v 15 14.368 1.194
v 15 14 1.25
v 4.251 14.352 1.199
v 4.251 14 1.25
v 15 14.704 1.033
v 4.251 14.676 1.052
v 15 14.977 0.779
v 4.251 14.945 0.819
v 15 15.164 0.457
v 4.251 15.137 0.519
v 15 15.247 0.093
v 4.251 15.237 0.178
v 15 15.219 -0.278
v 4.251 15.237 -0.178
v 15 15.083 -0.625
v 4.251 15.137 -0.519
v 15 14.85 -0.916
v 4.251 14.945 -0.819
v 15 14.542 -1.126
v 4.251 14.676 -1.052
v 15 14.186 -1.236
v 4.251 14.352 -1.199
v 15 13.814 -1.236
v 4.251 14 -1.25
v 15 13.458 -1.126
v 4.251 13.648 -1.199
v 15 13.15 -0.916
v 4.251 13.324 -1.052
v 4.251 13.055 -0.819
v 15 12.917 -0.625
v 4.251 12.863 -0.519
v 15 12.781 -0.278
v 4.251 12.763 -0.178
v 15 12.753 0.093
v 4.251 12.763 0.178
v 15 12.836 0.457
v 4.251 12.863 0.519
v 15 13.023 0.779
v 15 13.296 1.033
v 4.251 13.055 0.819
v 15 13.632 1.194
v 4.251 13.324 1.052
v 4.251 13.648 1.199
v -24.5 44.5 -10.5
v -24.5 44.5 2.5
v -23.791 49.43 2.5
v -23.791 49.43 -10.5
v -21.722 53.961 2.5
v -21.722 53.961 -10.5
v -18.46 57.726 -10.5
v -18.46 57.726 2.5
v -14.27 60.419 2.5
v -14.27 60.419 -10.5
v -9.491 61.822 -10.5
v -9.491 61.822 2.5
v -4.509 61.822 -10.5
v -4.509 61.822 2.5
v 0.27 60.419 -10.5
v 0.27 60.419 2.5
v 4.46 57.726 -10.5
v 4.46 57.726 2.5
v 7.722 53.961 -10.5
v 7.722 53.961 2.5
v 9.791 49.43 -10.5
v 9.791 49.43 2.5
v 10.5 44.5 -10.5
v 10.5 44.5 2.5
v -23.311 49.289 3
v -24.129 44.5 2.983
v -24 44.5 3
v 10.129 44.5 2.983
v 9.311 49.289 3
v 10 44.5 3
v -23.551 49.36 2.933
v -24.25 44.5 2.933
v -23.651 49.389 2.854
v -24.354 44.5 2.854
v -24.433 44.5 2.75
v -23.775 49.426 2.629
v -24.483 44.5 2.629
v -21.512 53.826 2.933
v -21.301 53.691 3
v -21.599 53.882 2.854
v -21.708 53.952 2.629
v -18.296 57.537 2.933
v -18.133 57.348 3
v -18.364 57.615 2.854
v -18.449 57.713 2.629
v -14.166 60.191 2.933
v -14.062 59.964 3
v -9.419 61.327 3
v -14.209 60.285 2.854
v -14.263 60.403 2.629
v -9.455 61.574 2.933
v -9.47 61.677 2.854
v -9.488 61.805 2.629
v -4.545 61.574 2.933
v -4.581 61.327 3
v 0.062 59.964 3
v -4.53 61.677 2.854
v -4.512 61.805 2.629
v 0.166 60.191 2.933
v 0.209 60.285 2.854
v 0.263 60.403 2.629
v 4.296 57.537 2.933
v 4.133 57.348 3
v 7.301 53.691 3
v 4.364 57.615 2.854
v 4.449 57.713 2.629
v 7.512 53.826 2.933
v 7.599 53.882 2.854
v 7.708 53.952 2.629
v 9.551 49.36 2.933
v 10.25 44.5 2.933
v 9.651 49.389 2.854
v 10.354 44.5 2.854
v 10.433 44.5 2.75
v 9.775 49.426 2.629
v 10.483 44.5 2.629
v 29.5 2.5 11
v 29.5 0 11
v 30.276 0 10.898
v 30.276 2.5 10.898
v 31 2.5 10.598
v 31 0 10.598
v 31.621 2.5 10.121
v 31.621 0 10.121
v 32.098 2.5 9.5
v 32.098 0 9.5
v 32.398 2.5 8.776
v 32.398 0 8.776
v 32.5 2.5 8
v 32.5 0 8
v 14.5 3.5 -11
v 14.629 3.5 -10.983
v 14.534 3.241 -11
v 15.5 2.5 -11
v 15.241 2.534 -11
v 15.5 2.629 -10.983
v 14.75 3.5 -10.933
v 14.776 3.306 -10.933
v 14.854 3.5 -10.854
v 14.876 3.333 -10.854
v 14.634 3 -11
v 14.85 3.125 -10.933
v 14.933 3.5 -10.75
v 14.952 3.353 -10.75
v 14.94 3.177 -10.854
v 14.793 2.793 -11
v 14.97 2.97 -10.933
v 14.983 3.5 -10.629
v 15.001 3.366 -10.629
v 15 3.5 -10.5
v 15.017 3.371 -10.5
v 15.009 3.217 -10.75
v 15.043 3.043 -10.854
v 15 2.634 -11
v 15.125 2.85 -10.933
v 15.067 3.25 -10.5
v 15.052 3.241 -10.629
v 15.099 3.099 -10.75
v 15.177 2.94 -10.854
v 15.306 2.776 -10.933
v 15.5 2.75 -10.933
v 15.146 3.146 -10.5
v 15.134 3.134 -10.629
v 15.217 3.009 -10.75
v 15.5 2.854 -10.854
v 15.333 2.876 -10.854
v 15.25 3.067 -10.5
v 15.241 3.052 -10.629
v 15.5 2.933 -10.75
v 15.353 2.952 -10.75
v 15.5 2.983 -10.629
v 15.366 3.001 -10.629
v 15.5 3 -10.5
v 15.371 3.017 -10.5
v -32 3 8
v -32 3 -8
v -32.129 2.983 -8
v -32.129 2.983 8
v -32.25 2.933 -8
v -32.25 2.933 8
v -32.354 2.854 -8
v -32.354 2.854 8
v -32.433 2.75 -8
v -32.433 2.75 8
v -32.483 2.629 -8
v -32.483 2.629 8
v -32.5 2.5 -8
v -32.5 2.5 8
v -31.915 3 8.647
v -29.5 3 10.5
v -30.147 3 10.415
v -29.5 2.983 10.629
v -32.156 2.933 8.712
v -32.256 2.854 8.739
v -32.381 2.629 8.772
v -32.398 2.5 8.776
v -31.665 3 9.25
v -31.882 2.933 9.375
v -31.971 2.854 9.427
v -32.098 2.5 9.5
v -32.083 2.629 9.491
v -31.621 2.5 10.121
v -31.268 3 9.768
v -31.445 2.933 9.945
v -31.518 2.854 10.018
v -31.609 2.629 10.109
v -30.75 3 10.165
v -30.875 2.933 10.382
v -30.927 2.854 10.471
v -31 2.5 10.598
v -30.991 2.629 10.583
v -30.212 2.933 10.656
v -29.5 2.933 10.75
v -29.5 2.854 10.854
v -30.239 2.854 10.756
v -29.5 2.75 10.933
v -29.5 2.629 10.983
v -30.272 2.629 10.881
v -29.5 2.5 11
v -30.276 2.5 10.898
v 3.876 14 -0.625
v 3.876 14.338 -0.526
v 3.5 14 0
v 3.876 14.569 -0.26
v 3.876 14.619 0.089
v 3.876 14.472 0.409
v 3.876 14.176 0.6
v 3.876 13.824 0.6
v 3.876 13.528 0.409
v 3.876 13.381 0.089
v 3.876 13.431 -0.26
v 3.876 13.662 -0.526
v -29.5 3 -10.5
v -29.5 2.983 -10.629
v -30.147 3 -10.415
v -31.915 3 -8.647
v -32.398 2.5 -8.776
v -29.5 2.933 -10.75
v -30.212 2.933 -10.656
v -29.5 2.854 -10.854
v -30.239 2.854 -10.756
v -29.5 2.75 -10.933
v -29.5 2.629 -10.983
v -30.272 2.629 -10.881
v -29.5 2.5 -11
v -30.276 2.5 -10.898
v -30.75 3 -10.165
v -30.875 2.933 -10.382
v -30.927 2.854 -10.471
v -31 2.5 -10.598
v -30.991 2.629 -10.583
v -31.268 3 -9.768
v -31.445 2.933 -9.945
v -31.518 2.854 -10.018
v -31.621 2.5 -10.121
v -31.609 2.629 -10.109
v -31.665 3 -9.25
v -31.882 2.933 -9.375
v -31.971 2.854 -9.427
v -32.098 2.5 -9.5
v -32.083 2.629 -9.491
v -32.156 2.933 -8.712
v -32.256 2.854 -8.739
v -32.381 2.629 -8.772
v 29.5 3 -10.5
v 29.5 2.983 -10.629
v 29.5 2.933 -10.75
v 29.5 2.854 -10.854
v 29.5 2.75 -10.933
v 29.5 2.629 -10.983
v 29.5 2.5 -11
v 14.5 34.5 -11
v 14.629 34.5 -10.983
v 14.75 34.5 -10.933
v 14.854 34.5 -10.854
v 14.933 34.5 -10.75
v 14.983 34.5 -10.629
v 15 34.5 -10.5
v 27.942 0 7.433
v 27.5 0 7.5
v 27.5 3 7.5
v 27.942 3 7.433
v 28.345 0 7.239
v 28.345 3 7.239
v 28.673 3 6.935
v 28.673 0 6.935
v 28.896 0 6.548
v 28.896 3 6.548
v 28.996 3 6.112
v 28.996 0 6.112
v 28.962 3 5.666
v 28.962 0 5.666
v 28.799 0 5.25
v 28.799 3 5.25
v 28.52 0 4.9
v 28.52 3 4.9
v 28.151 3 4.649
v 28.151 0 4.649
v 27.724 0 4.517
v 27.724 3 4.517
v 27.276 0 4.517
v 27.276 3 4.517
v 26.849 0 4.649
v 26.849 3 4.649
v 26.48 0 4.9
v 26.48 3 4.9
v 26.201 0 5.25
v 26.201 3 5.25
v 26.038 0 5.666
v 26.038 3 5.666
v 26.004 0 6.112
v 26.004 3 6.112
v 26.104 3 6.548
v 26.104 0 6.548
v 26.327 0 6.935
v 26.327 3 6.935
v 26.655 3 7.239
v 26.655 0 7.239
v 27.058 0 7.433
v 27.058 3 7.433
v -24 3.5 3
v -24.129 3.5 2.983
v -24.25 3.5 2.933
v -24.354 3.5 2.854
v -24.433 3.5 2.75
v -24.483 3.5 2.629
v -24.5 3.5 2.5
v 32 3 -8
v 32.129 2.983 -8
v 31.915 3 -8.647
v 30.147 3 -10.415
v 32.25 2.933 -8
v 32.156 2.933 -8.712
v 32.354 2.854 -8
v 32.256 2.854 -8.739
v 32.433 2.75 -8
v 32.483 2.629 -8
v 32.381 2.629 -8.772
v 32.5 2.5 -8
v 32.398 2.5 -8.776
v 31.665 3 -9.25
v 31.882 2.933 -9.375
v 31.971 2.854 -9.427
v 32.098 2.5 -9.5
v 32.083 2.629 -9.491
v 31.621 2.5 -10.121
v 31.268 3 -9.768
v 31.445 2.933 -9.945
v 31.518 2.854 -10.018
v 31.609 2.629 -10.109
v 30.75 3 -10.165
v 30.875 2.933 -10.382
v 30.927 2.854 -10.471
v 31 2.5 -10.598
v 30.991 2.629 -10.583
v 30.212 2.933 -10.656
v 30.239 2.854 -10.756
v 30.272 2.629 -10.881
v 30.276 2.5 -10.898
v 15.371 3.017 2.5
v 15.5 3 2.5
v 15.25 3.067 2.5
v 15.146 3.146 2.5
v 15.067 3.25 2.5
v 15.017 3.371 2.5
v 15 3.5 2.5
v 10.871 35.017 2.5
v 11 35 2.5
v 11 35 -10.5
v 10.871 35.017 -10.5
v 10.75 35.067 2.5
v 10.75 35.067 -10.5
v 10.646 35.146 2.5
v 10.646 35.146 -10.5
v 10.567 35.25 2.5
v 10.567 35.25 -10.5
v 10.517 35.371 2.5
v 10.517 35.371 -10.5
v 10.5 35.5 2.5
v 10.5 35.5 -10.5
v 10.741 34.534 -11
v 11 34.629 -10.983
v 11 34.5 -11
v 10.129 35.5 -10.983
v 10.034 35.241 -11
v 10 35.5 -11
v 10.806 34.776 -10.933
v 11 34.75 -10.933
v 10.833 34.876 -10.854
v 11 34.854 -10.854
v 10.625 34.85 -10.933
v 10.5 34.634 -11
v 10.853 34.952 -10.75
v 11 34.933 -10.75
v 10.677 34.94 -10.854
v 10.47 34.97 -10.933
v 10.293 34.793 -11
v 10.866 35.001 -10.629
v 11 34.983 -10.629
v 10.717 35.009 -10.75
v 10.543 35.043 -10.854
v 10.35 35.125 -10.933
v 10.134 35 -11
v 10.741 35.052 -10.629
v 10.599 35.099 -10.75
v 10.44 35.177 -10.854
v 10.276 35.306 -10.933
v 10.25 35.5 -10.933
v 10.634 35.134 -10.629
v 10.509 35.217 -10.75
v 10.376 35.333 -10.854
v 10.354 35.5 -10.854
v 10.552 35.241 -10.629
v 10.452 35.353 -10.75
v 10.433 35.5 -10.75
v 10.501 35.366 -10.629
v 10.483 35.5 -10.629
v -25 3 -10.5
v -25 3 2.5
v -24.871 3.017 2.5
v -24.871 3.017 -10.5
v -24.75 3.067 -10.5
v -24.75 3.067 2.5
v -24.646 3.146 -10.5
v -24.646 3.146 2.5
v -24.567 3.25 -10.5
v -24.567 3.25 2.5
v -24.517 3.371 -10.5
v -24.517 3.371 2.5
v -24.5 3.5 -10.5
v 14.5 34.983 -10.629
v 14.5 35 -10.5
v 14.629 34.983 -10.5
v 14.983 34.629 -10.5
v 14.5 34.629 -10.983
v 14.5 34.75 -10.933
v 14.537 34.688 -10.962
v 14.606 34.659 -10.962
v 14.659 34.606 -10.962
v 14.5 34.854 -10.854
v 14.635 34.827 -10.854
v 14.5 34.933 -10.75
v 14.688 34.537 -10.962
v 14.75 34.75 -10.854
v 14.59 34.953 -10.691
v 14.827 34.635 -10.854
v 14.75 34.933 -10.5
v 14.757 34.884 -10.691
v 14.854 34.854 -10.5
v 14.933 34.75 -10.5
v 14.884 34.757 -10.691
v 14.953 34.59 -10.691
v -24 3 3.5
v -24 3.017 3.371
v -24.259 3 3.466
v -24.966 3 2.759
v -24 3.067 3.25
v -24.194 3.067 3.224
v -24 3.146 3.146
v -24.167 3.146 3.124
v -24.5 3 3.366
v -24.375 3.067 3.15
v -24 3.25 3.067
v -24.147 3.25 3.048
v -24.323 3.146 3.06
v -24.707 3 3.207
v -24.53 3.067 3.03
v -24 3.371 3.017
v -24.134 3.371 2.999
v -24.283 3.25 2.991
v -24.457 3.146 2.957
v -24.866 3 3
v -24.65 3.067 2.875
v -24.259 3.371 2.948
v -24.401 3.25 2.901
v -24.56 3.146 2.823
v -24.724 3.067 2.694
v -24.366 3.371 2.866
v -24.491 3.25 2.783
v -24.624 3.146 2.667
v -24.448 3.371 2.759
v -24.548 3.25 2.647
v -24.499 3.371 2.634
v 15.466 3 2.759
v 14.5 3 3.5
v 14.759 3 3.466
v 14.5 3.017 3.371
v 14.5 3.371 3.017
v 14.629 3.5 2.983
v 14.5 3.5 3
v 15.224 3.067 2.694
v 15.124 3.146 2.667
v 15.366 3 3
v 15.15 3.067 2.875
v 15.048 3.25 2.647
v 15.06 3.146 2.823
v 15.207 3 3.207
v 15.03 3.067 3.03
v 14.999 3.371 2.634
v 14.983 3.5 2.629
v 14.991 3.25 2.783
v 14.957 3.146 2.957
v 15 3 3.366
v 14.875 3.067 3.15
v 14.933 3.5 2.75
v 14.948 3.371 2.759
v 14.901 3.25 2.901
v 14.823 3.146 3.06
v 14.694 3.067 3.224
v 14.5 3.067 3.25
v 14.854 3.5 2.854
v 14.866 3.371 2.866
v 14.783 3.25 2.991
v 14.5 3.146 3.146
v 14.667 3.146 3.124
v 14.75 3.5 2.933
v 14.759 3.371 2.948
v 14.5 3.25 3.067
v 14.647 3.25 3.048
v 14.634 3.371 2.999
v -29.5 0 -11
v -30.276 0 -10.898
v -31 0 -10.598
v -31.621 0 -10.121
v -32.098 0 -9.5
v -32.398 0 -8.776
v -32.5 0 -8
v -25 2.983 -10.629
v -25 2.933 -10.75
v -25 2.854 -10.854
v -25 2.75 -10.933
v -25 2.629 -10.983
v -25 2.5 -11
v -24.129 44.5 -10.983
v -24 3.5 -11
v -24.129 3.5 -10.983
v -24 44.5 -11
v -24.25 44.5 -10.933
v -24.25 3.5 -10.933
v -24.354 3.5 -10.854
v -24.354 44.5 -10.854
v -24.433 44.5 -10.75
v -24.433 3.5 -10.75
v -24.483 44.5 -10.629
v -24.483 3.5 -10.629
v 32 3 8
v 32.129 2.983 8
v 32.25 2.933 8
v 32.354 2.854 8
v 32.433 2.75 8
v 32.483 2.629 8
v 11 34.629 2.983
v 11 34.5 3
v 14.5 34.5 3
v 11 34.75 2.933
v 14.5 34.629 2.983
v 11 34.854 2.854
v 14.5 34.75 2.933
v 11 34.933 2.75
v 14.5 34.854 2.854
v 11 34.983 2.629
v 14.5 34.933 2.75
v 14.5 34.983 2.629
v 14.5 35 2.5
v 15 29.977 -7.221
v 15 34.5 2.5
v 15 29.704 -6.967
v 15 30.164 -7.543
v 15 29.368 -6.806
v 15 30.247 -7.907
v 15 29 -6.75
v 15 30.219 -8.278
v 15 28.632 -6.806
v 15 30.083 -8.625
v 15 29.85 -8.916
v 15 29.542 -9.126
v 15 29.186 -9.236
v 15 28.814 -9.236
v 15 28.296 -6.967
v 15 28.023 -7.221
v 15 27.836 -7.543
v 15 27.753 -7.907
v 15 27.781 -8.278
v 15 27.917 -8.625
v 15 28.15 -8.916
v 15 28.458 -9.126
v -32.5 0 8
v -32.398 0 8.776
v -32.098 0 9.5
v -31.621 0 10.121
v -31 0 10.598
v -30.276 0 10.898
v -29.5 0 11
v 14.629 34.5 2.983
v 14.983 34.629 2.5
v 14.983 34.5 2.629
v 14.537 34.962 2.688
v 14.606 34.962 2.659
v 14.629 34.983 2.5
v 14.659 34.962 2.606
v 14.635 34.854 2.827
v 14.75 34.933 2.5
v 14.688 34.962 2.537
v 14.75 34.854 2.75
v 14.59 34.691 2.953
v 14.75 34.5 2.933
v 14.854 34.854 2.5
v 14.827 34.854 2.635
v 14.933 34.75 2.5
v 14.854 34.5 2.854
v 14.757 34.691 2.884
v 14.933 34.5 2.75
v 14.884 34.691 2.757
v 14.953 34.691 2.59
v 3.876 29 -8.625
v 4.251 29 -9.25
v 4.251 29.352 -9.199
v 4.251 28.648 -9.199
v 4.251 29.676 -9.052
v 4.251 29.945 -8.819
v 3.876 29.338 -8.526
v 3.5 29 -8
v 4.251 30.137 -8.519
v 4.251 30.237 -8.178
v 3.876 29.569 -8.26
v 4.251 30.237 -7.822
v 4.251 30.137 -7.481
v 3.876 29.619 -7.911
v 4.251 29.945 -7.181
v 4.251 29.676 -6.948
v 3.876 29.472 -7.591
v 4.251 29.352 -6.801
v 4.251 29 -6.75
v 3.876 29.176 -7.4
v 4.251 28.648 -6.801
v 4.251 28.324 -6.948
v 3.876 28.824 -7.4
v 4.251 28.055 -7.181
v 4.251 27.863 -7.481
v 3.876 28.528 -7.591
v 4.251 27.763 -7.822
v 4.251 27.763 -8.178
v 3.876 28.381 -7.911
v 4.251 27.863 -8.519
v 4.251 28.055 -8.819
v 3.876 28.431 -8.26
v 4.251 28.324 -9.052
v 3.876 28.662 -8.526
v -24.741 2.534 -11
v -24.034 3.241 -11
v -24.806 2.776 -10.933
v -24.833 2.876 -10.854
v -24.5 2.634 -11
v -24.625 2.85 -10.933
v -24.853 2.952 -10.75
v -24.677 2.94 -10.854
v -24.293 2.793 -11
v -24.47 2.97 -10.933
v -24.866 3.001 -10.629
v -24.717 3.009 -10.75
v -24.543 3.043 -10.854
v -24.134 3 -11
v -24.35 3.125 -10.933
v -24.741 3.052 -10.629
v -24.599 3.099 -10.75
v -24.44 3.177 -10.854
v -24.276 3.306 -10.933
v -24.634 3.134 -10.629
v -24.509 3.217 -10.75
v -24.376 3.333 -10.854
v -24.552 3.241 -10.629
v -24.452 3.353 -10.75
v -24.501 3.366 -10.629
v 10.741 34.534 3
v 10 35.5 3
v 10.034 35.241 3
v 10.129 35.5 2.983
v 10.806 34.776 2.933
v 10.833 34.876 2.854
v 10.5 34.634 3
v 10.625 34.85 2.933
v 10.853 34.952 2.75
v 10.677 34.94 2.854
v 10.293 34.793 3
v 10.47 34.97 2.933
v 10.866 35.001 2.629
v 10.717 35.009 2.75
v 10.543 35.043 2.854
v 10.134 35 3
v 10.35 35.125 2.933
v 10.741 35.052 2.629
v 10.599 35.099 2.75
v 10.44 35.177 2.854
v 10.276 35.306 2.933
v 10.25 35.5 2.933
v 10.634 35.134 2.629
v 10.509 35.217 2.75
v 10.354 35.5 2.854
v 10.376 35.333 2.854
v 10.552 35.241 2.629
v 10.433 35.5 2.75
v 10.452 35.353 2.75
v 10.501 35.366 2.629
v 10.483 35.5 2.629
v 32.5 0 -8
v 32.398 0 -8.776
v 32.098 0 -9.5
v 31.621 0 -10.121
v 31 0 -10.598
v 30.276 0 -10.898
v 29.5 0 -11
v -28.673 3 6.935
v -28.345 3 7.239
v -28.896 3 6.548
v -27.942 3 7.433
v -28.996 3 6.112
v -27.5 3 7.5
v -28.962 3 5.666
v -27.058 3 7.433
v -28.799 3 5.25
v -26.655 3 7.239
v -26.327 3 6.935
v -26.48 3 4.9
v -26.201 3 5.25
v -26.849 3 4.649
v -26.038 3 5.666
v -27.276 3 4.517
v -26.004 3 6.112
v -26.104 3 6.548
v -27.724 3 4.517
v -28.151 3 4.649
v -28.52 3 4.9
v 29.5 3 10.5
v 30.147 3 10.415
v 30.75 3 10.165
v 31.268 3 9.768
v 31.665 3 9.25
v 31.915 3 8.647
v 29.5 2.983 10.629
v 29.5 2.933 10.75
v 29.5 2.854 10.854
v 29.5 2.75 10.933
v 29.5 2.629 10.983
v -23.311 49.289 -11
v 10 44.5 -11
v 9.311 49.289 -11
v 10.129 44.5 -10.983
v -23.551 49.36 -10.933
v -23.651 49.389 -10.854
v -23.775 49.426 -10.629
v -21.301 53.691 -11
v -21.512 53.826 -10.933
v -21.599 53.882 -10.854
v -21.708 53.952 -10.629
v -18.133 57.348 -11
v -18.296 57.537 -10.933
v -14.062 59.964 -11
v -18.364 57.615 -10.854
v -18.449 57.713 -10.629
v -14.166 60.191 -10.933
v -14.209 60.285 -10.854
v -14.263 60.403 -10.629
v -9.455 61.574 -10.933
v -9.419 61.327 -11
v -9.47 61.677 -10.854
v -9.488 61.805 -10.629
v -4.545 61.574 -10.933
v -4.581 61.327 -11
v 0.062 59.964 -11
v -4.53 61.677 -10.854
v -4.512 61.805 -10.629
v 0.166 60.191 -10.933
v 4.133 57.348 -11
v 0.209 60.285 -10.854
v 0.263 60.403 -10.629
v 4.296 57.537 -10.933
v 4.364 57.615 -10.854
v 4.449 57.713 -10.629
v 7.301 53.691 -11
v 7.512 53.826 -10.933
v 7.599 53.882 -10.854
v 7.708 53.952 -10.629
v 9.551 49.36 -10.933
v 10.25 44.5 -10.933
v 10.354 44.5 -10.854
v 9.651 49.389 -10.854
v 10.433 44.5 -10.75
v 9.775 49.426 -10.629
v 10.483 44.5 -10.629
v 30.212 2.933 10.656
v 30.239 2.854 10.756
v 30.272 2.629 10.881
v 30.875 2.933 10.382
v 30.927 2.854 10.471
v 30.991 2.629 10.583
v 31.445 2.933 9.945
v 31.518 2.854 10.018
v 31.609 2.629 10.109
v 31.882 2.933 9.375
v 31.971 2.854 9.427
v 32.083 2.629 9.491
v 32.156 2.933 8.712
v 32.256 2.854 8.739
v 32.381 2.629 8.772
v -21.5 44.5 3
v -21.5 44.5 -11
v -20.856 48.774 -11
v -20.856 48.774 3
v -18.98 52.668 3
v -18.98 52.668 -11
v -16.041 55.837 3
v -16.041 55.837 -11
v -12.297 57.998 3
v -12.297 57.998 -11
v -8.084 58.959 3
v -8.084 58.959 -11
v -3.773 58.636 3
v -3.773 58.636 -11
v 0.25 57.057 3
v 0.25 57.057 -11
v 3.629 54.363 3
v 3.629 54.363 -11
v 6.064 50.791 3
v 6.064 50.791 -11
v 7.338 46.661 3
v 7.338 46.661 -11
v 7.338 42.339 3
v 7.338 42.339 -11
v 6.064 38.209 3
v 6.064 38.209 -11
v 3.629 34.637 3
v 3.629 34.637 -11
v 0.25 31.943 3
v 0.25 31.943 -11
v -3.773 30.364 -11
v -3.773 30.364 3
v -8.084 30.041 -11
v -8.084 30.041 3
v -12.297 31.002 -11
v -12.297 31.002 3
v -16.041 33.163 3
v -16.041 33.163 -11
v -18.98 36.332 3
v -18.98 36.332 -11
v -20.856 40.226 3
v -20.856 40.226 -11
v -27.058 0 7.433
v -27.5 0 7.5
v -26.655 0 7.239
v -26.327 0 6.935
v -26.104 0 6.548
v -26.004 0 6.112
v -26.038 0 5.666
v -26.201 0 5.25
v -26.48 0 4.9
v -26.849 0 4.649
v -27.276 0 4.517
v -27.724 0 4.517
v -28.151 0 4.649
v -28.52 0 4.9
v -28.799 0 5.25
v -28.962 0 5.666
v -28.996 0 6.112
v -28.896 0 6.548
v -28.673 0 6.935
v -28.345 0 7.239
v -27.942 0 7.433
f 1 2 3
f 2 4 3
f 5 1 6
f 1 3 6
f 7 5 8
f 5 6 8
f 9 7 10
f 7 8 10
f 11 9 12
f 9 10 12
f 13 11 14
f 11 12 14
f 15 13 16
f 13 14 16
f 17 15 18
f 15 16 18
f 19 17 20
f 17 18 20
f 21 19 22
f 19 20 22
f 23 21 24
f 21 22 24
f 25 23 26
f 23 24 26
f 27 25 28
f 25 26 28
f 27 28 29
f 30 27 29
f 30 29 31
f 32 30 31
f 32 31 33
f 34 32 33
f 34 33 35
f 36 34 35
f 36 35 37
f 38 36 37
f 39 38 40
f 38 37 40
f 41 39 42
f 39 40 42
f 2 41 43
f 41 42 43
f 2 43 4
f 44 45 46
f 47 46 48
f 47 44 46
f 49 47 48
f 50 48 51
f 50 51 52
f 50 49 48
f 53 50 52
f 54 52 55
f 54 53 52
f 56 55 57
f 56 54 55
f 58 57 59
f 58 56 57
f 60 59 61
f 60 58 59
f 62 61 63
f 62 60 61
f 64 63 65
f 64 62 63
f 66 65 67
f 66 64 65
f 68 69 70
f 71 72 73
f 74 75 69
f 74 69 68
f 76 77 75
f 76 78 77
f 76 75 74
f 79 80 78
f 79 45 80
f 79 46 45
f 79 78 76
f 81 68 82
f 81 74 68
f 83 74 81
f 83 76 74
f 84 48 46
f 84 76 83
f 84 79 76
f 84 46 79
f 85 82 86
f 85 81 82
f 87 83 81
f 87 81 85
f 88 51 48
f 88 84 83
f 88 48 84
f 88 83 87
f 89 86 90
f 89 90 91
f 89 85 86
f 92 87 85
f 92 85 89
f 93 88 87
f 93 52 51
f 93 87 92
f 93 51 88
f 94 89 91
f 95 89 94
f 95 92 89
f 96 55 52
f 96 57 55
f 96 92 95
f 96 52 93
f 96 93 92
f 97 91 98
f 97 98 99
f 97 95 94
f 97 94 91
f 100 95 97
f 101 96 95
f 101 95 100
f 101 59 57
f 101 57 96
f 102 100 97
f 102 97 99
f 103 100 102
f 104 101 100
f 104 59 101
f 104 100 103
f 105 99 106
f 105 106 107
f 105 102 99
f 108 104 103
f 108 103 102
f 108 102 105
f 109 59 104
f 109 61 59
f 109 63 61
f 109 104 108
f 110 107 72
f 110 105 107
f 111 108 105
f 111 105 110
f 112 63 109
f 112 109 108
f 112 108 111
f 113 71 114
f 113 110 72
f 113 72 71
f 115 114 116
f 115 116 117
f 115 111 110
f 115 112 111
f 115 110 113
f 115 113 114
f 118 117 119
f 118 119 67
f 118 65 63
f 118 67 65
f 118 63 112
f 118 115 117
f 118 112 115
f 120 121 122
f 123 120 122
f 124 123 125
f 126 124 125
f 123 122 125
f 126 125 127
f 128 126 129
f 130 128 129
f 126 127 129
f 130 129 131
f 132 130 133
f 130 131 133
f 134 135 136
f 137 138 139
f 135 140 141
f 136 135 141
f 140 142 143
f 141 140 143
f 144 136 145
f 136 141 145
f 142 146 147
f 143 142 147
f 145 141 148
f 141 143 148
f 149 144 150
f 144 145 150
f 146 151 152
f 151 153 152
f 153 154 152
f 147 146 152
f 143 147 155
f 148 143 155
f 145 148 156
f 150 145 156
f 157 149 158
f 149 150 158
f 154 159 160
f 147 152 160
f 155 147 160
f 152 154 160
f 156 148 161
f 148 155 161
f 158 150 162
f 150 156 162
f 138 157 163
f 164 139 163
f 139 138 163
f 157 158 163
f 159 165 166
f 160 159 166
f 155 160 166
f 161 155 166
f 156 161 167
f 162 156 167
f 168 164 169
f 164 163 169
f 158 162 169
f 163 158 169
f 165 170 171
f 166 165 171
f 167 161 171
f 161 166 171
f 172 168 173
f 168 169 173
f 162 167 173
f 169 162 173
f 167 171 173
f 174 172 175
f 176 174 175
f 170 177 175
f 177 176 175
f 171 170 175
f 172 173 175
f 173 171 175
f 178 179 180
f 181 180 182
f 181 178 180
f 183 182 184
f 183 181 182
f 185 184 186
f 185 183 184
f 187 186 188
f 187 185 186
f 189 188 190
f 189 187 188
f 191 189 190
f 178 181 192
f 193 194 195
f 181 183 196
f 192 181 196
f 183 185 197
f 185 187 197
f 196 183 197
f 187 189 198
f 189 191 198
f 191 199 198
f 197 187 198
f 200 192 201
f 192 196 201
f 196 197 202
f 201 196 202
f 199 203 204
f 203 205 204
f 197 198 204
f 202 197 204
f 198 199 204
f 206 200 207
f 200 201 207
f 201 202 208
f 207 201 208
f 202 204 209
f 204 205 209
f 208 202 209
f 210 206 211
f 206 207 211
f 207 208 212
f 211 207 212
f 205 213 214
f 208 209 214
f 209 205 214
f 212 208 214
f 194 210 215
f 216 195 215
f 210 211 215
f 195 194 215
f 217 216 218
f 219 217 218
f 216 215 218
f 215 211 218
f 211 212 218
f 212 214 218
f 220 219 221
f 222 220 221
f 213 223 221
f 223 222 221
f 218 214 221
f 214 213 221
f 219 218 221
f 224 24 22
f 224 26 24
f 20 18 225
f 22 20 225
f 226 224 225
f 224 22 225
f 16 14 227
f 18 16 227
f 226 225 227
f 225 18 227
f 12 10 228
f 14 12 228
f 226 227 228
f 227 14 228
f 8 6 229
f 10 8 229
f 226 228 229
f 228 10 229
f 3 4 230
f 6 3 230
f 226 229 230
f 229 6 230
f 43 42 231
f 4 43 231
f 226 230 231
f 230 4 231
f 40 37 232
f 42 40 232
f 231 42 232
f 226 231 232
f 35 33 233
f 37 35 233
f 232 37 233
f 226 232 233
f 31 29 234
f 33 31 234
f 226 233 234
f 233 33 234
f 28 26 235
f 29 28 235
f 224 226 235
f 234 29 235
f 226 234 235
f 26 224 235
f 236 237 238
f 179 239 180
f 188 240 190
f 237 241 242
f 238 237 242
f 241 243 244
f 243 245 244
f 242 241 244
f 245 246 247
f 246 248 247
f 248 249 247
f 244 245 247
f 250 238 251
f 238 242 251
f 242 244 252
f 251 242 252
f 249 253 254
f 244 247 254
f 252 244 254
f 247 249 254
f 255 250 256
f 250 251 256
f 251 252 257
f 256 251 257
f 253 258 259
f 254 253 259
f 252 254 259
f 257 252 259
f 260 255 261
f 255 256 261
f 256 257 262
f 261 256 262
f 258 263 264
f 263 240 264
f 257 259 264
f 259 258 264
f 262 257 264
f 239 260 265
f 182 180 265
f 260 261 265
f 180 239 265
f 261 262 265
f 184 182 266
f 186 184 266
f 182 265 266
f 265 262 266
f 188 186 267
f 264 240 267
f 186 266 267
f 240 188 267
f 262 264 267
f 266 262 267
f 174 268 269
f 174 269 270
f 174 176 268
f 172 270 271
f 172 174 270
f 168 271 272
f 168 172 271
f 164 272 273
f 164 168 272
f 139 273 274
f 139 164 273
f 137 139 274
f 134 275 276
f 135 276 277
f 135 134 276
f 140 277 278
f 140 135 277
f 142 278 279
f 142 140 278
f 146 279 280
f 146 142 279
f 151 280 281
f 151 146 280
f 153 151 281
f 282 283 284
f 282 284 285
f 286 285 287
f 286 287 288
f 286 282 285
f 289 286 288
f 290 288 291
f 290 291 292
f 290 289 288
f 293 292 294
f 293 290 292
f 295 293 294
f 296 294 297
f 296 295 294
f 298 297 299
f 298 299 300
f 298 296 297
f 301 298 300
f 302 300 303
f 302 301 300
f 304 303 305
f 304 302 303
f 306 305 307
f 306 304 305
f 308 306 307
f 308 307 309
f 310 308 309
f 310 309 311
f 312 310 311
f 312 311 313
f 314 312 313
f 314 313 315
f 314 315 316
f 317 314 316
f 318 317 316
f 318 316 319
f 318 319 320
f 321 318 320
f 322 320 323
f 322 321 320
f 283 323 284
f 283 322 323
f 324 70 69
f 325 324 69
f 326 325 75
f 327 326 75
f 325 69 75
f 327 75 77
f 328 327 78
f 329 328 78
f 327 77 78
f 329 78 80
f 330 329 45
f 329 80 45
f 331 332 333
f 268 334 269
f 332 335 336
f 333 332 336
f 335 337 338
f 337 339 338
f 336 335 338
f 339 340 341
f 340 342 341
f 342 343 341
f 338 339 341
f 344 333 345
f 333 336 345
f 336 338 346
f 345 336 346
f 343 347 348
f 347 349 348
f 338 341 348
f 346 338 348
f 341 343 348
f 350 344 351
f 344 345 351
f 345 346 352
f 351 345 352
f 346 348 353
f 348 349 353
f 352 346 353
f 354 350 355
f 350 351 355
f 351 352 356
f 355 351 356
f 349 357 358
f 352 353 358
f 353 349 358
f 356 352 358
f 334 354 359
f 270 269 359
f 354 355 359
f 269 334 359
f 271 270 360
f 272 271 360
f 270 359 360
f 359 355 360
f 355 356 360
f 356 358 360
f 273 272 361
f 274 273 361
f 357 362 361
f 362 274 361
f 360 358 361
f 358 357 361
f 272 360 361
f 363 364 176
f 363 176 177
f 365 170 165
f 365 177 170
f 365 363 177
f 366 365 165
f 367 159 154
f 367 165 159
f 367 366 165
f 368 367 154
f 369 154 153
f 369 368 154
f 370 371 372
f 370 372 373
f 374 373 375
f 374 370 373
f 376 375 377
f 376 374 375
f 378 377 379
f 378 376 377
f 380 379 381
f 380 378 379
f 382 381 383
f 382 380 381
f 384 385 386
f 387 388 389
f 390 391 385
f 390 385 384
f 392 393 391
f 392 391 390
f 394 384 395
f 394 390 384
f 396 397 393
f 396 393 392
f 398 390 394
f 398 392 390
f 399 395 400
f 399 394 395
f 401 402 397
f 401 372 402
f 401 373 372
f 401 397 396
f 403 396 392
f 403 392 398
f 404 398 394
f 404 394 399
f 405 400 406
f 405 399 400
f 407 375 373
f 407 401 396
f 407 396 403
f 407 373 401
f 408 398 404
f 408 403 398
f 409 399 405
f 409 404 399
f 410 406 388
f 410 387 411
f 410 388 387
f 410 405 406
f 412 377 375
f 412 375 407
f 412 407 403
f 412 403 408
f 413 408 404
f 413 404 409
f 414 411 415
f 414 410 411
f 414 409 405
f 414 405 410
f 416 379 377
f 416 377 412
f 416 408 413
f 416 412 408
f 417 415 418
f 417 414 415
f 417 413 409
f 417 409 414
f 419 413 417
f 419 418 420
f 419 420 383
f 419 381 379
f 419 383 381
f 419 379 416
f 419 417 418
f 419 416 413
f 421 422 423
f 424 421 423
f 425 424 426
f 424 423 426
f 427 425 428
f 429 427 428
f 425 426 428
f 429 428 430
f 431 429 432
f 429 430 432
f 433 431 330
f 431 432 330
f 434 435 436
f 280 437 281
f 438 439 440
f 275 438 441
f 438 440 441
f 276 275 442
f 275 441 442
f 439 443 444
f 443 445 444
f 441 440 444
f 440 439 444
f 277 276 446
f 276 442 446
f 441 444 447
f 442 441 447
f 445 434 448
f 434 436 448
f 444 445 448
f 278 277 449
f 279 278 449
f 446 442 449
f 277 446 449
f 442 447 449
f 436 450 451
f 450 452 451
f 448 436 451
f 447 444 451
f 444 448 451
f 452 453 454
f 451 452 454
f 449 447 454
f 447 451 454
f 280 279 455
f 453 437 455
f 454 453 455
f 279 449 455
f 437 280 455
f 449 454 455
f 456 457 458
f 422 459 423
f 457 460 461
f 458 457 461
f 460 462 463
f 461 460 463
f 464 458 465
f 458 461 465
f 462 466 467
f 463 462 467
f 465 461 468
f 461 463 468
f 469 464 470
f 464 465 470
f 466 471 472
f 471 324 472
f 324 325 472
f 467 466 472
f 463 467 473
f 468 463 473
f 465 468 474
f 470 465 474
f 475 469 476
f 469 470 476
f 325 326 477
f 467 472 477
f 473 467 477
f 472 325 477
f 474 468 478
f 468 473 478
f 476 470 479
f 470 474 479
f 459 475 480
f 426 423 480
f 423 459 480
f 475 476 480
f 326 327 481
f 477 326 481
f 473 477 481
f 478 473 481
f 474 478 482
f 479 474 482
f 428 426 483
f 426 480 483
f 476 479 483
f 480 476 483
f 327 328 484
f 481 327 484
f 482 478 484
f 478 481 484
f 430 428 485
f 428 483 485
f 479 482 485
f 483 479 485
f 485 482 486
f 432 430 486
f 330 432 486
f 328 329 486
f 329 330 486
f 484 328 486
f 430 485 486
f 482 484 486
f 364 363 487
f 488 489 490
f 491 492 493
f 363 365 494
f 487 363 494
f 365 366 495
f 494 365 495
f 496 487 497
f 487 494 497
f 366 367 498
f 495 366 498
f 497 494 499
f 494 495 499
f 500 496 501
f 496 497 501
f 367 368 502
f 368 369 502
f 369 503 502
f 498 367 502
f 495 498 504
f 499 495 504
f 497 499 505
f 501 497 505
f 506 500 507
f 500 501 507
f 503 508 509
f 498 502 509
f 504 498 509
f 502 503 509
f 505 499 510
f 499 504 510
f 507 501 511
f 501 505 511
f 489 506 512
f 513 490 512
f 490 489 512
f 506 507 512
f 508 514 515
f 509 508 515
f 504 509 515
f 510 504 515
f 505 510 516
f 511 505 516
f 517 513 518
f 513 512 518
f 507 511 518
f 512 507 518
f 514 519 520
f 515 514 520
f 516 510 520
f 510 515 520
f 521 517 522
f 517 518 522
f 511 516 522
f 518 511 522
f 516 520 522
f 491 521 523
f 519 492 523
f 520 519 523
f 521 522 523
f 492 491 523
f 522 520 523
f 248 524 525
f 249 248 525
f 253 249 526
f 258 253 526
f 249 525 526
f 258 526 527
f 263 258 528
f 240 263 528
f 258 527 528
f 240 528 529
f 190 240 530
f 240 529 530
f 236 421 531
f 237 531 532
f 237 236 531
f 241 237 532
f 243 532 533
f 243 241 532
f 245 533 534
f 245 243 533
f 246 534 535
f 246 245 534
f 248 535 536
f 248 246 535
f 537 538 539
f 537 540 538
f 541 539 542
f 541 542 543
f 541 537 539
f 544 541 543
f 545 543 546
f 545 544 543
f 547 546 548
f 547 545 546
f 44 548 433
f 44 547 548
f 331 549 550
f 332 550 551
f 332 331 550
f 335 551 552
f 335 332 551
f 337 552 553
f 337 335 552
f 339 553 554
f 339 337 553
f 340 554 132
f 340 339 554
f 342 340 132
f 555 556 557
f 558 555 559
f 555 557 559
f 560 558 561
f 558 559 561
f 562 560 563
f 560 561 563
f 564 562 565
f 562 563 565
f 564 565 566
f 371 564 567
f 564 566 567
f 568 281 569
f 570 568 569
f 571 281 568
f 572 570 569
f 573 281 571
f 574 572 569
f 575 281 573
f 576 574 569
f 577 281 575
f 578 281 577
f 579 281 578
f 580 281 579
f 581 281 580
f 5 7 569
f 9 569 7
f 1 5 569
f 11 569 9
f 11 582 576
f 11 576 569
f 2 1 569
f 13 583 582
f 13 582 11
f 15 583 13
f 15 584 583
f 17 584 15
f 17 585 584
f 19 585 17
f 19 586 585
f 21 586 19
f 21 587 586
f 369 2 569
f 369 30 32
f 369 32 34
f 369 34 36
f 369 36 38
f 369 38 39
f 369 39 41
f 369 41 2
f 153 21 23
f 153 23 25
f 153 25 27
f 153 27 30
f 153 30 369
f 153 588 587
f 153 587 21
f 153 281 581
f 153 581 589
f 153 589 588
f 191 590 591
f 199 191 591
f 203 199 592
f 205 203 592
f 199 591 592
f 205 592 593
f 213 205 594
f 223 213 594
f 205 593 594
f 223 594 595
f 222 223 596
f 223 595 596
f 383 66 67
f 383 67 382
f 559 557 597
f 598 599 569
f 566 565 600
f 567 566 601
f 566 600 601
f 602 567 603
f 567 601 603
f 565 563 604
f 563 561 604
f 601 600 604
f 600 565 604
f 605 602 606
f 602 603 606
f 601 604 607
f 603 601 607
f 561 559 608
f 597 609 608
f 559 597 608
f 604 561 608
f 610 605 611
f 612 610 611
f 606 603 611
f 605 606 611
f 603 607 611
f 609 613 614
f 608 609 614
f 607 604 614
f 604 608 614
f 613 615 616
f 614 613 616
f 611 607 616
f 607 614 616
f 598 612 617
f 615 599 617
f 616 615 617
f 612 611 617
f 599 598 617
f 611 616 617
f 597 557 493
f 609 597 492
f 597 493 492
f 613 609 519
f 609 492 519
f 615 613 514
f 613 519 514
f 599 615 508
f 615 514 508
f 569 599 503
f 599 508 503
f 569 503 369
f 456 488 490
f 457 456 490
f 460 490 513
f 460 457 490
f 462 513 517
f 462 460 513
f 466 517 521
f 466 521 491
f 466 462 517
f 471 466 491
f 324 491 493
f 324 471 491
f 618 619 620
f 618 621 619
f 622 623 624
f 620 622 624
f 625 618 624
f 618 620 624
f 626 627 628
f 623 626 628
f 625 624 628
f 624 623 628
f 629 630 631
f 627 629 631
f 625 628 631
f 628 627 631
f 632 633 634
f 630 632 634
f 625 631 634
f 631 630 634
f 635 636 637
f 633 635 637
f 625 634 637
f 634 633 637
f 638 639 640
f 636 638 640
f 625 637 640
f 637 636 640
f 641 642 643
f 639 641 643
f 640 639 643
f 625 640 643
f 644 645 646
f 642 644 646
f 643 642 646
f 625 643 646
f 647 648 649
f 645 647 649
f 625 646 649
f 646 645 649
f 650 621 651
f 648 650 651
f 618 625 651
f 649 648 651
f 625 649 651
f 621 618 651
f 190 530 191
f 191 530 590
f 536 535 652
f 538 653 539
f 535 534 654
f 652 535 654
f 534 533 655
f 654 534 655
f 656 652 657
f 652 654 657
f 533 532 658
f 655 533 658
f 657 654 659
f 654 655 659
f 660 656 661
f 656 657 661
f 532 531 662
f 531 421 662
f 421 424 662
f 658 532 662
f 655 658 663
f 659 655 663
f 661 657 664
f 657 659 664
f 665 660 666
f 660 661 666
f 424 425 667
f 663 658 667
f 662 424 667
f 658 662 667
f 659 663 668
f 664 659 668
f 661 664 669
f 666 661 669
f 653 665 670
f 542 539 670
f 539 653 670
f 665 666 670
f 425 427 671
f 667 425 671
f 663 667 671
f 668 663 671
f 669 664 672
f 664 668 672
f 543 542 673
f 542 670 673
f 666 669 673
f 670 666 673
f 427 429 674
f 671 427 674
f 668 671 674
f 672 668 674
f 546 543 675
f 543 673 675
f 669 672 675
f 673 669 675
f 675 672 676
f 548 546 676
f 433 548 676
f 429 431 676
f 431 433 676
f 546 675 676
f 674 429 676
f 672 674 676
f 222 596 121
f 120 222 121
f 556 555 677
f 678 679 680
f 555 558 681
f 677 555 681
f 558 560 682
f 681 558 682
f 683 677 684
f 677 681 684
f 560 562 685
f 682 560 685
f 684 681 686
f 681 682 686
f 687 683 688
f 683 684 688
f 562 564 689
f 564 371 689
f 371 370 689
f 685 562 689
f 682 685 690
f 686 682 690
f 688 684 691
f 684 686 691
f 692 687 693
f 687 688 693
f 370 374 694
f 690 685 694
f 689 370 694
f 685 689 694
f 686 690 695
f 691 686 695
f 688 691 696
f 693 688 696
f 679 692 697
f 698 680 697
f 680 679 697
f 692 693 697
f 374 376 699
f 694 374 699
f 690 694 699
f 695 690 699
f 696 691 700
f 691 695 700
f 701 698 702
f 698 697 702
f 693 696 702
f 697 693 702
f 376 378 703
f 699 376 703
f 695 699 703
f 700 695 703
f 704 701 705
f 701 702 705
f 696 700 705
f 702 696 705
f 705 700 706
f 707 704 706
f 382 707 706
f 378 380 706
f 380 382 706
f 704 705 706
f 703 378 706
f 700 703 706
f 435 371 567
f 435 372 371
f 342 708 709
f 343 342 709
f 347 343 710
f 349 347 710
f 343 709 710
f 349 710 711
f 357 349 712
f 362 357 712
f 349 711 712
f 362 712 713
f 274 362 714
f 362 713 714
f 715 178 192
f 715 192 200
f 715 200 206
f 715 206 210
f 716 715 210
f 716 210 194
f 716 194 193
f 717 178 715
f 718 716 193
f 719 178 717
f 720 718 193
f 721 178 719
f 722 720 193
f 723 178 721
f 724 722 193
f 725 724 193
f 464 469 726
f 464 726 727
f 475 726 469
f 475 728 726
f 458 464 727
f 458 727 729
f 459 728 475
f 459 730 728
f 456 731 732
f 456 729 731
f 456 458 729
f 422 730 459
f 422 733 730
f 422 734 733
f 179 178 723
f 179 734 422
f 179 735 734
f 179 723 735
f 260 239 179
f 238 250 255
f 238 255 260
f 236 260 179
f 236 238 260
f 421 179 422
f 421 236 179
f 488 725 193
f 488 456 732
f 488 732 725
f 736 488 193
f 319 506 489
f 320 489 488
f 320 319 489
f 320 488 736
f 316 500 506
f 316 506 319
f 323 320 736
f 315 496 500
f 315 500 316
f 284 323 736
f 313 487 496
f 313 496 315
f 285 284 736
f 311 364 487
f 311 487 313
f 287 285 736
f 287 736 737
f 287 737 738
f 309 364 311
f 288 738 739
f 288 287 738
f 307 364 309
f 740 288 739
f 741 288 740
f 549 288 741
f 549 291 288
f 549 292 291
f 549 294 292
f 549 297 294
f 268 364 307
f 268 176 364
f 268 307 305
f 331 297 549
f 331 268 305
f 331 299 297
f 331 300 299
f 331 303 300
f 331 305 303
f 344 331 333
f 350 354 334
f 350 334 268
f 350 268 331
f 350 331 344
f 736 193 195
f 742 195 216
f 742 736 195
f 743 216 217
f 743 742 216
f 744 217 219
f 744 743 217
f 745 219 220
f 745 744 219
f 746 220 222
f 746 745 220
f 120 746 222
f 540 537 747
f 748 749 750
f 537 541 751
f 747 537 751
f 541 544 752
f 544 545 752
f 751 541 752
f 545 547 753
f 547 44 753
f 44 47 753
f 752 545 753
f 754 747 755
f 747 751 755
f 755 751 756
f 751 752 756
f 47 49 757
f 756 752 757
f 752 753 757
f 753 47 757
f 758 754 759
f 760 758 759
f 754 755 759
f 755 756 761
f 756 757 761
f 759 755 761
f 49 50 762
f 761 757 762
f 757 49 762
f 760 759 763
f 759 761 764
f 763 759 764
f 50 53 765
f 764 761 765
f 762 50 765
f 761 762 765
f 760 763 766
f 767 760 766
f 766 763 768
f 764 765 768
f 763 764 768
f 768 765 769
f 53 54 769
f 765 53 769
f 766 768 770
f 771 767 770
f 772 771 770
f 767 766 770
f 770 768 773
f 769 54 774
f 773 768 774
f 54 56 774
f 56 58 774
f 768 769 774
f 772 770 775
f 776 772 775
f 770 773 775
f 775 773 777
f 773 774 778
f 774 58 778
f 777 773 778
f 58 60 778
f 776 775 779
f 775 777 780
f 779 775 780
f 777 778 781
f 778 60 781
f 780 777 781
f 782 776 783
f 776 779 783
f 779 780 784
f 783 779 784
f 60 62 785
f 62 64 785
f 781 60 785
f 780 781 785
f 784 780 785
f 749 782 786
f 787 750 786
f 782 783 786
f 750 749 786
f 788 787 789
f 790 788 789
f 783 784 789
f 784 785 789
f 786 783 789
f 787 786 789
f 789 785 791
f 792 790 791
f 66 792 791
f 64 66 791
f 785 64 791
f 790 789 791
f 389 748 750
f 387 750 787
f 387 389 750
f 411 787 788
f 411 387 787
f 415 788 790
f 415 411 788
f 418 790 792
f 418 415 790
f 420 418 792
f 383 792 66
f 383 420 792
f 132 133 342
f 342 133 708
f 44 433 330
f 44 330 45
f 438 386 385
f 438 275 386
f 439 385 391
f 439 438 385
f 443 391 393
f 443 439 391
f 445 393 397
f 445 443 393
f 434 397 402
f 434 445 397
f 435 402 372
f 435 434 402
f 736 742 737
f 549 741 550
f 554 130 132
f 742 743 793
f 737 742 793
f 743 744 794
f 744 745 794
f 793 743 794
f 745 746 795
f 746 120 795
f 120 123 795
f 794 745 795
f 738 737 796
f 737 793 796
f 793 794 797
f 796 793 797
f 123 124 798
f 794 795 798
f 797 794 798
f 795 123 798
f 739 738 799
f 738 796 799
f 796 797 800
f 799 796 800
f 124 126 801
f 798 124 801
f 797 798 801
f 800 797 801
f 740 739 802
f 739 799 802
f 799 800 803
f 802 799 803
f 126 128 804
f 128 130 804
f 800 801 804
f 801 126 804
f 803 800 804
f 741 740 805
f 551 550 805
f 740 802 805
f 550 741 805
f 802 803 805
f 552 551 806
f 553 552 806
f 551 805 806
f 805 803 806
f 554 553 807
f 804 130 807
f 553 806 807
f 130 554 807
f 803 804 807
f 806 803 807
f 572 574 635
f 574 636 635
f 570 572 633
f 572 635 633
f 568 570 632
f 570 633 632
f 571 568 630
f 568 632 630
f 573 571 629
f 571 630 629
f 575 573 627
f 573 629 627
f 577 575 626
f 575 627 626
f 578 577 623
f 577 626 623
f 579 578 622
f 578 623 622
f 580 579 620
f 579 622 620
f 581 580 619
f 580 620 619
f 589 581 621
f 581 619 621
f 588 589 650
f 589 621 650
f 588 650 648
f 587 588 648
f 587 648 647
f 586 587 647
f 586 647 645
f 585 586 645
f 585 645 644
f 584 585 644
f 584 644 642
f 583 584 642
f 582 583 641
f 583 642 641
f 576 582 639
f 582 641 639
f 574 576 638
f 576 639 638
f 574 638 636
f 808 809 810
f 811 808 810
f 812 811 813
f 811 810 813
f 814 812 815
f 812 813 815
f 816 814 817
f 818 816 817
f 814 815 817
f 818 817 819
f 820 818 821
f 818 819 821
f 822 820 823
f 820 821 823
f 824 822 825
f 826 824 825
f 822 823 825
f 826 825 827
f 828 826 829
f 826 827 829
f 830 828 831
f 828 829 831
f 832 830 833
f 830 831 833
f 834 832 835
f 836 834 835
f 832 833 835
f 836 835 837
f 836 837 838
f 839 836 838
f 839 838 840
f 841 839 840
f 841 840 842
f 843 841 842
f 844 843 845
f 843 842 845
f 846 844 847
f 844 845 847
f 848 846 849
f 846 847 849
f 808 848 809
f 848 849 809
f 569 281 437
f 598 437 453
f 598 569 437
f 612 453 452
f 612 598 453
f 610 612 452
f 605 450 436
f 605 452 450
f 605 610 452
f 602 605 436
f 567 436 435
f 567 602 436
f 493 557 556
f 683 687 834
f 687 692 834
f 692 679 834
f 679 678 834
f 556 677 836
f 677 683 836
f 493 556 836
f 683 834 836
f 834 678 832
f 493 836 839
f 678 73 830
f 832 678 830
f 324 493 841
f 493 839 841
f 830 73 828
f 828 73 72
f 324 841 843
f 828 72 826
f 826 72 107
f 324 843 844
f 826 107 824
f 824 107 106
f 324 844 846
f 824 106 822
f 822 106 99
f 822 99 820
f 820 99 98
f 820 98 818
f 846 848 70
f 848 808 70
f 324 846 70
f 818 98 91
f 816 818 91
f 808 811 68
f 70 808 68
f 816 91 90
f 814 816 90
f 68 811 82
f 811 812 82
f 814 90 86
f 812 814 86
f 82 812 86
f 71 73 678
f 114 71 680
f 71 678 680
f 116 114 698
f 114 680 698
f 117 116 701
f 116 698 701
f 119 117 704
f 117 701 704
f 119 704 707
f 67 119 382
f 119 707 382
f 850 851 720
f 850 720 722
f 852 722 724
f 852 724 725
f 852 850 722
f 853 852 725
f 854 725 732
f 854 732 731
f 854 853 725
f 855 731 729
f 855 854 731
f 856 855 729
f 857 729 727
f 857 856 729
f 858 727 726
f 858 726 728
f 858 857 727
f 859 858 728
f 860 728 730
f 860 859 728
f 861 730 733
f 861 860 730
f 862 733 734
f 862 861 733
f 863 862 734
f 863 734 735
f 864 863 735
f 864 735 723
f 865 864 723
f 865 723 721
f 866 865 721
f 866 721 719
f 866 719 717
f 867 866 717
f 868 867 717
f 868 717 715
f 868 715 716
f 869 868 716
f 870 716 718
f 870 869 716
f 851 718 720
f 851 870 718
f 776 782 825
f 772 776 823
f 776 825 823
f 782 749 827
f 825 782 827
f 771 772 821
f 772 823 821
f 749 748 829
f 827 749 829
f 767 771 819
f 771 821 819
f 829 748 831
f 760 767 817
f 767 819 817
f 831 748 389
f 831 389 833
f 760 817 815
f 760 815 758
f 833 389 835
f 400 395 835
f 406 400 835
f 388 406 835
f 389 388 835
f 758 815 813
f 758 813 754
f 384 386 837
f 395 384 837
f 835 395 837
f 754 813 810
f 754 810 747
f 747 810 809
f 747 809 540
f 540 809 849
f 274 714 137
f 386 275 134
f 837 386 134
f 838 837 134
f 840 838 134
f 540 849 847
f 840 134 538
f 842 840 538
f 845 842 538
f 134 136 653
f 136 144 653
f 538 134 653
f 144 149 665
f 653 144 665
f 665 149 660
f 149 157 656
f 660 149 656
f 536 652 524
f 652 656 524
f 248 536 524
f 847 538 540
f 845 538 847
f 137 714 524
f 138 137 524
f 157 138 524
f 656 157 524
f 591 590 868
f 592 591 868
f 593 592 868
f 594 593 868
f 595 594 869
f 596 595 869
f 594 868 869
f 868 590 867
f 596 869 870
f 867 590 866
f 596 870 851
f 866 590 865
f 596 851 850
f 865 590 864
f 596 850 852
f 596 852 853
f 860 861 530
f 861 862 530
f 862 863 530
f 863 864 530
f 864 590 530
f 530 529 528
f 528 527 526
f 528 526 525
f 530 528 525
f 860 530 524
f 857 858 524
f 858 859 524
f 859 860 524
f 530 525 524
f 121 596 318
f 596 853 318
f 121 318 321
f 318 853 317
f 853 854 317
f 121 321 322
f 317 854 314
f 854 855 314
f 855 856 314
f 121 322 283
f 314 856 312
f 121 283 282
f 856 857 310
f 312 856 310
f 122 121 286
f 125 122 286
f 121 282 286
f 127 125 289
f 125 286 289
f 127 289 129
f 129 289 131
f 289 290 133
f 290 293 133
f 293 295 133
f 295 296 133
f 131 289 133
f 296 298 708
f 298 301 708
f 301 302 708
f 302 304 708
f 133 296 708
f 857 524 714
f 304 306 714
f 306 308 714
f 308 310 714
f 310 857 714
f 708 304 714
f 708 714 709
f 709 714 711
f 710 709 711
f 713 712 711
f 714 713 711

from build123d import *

# Parameters (mm, degrees)
SKETCH1_R                 = 1.5
BOSS_EXTRUDE1_DEPTH       = 3
SKETCH3_R                 = 14.5
BOSS_EXTRUDE2_DEPTH       = 14
M3X0_5_TAPPED_HOLE1_D     = 2.5
M3X0_5_TAPPED_HOLE1_DEPTH = 10.748924226
M3X0_5_TAPPED_HOLE1_TIP   = 0.751075774
FILLET2_R                 = 0.5


with BuildPart() as part:
    # Sketch1 → Boss-Extrude1 (new body)
    with BuildSketch(Plane(origin=(0, 0, 0), x_dir=(1, 0, 0), z_dir=(0, 1, 0))):
        with BuildLine():
            Line((-29.5, -11), (29.5, -11))
            ThreePointArc((29.5, -11), (31.621320344, -10.121320344), (32.5, -8))
            Line((32.5, -8), (32.5, 8))
            ThreePointArc((32.5, 8), (31.621320344, 10.121320344), (29.5, 11))
            Line((29.5, 11), (-29.5, 11))
            ThreePointArc((-29.5, 11), (-31.621320344, 10.121320344), (-32.5, 8))
            Line((-32.5, 8), (-32.5, -8))
            ThreePointArc((-32.5, -8), (-31.621320344, -10.121320344), (-29.5, -11))
        make_face()
        with Locations(Location((-27.5, -6, 0), (0, 0, 270))):
            Circle(SKETCH1_R, mode=Mode.SUBTRACT)
        with Locations(Location((27.5, -6, 0), (0, 0, 270))):
            Circle(SKETCH1_R, mode=Mode.SUBTRACT)
    extrude(amount=BOSS_EXTRUDE1_DEPTH)

    # Sketch3 → Boss-Extrude2 (add)
    with BuildSketch(Plane(origin=(0, 0, -11), x_dir=(-1, 0, 0), z_dir=(0, 0, -1))):
        with BuildLine():
            Line((24.5, 3), (24.5, 44.5))
            ThreePointArc((24.5, 44.5), (7, 62), (-10.5, 44.5))
            Line((-10.5, 44.5), (-10.5, 35))
            Line((-10.5, 35), (-15, 35))
            Line((-15, 35), (-15, 3))
            Line((-15, 3), (24.5, 3))
        make_face()
        with Locations((7, 44.5)):
            Circle(SKETCH3_R, mode=Mode.SUBTRACT)
    extrude(amount=-BOSS_EXTRUDE2_DEPTH)

    # M3x0.5 Tapped Hole1
    with Locations(Plane(origin=(15, 0, 0), x_dir=(0, 0, -1), z_dir=(1, 0, 0))):
        with Locations((0, 14), (8, 29)):
            Hole(M3X0_5_TAPPED_HOLE1_D / 2, depth=M3X0_5_TAPPED_HOLE1_DEPTH)
            with Locations((0, 0, -(M3X0_5_TAPPED_HOLE1_DEPTH + M3X0_5_TAPPED_HOLE1_TIP / 2))):  # 118° drill point
                Cone(0, M3X0_5_TAPPED_HOLE1_D / 2, M3X0_5_TAPPED_HOLE1_TIP, mode=Mode.SUBTRACT)

    # Fillet2
    fillet2_edges = [part.edges().sort_by_distance(p)[0] for p in [
        (-31.621320344, 3, -10.121320344),
        (-32.5, 3, 0),
        (-31.621320344, 3, 10.121320344),
        (0, 3, 11),
        (31.621320344, 3, 10.121320344),
        (32.5, 3, 0),
        (-27, 3, -11),
        (-24.5, 23.75, -11),
        (-24.5, 3, -4),
        (15, 19, 3),
        (15, 3, -4),
        (12.75, 35, 3),
        (15, 35, -4),
        (10.5, 39.75, 3),
        (10.5, 35, -4),
        (-7, 62, 3),
        (-24.5, 23.75, 3),
        (-4.75, 3, 3),
        (-7, 62, -11),
        (10.5, 39.75, -11),
        (12.75, 35, -11),
        (15, 19, -11),
        (31.621320344, 3, -10.121320344),
        (22.25, 3, -11),
    ]]
    fillet(fillet2_edges, radius=FILLET2_R)


solid = part.part
